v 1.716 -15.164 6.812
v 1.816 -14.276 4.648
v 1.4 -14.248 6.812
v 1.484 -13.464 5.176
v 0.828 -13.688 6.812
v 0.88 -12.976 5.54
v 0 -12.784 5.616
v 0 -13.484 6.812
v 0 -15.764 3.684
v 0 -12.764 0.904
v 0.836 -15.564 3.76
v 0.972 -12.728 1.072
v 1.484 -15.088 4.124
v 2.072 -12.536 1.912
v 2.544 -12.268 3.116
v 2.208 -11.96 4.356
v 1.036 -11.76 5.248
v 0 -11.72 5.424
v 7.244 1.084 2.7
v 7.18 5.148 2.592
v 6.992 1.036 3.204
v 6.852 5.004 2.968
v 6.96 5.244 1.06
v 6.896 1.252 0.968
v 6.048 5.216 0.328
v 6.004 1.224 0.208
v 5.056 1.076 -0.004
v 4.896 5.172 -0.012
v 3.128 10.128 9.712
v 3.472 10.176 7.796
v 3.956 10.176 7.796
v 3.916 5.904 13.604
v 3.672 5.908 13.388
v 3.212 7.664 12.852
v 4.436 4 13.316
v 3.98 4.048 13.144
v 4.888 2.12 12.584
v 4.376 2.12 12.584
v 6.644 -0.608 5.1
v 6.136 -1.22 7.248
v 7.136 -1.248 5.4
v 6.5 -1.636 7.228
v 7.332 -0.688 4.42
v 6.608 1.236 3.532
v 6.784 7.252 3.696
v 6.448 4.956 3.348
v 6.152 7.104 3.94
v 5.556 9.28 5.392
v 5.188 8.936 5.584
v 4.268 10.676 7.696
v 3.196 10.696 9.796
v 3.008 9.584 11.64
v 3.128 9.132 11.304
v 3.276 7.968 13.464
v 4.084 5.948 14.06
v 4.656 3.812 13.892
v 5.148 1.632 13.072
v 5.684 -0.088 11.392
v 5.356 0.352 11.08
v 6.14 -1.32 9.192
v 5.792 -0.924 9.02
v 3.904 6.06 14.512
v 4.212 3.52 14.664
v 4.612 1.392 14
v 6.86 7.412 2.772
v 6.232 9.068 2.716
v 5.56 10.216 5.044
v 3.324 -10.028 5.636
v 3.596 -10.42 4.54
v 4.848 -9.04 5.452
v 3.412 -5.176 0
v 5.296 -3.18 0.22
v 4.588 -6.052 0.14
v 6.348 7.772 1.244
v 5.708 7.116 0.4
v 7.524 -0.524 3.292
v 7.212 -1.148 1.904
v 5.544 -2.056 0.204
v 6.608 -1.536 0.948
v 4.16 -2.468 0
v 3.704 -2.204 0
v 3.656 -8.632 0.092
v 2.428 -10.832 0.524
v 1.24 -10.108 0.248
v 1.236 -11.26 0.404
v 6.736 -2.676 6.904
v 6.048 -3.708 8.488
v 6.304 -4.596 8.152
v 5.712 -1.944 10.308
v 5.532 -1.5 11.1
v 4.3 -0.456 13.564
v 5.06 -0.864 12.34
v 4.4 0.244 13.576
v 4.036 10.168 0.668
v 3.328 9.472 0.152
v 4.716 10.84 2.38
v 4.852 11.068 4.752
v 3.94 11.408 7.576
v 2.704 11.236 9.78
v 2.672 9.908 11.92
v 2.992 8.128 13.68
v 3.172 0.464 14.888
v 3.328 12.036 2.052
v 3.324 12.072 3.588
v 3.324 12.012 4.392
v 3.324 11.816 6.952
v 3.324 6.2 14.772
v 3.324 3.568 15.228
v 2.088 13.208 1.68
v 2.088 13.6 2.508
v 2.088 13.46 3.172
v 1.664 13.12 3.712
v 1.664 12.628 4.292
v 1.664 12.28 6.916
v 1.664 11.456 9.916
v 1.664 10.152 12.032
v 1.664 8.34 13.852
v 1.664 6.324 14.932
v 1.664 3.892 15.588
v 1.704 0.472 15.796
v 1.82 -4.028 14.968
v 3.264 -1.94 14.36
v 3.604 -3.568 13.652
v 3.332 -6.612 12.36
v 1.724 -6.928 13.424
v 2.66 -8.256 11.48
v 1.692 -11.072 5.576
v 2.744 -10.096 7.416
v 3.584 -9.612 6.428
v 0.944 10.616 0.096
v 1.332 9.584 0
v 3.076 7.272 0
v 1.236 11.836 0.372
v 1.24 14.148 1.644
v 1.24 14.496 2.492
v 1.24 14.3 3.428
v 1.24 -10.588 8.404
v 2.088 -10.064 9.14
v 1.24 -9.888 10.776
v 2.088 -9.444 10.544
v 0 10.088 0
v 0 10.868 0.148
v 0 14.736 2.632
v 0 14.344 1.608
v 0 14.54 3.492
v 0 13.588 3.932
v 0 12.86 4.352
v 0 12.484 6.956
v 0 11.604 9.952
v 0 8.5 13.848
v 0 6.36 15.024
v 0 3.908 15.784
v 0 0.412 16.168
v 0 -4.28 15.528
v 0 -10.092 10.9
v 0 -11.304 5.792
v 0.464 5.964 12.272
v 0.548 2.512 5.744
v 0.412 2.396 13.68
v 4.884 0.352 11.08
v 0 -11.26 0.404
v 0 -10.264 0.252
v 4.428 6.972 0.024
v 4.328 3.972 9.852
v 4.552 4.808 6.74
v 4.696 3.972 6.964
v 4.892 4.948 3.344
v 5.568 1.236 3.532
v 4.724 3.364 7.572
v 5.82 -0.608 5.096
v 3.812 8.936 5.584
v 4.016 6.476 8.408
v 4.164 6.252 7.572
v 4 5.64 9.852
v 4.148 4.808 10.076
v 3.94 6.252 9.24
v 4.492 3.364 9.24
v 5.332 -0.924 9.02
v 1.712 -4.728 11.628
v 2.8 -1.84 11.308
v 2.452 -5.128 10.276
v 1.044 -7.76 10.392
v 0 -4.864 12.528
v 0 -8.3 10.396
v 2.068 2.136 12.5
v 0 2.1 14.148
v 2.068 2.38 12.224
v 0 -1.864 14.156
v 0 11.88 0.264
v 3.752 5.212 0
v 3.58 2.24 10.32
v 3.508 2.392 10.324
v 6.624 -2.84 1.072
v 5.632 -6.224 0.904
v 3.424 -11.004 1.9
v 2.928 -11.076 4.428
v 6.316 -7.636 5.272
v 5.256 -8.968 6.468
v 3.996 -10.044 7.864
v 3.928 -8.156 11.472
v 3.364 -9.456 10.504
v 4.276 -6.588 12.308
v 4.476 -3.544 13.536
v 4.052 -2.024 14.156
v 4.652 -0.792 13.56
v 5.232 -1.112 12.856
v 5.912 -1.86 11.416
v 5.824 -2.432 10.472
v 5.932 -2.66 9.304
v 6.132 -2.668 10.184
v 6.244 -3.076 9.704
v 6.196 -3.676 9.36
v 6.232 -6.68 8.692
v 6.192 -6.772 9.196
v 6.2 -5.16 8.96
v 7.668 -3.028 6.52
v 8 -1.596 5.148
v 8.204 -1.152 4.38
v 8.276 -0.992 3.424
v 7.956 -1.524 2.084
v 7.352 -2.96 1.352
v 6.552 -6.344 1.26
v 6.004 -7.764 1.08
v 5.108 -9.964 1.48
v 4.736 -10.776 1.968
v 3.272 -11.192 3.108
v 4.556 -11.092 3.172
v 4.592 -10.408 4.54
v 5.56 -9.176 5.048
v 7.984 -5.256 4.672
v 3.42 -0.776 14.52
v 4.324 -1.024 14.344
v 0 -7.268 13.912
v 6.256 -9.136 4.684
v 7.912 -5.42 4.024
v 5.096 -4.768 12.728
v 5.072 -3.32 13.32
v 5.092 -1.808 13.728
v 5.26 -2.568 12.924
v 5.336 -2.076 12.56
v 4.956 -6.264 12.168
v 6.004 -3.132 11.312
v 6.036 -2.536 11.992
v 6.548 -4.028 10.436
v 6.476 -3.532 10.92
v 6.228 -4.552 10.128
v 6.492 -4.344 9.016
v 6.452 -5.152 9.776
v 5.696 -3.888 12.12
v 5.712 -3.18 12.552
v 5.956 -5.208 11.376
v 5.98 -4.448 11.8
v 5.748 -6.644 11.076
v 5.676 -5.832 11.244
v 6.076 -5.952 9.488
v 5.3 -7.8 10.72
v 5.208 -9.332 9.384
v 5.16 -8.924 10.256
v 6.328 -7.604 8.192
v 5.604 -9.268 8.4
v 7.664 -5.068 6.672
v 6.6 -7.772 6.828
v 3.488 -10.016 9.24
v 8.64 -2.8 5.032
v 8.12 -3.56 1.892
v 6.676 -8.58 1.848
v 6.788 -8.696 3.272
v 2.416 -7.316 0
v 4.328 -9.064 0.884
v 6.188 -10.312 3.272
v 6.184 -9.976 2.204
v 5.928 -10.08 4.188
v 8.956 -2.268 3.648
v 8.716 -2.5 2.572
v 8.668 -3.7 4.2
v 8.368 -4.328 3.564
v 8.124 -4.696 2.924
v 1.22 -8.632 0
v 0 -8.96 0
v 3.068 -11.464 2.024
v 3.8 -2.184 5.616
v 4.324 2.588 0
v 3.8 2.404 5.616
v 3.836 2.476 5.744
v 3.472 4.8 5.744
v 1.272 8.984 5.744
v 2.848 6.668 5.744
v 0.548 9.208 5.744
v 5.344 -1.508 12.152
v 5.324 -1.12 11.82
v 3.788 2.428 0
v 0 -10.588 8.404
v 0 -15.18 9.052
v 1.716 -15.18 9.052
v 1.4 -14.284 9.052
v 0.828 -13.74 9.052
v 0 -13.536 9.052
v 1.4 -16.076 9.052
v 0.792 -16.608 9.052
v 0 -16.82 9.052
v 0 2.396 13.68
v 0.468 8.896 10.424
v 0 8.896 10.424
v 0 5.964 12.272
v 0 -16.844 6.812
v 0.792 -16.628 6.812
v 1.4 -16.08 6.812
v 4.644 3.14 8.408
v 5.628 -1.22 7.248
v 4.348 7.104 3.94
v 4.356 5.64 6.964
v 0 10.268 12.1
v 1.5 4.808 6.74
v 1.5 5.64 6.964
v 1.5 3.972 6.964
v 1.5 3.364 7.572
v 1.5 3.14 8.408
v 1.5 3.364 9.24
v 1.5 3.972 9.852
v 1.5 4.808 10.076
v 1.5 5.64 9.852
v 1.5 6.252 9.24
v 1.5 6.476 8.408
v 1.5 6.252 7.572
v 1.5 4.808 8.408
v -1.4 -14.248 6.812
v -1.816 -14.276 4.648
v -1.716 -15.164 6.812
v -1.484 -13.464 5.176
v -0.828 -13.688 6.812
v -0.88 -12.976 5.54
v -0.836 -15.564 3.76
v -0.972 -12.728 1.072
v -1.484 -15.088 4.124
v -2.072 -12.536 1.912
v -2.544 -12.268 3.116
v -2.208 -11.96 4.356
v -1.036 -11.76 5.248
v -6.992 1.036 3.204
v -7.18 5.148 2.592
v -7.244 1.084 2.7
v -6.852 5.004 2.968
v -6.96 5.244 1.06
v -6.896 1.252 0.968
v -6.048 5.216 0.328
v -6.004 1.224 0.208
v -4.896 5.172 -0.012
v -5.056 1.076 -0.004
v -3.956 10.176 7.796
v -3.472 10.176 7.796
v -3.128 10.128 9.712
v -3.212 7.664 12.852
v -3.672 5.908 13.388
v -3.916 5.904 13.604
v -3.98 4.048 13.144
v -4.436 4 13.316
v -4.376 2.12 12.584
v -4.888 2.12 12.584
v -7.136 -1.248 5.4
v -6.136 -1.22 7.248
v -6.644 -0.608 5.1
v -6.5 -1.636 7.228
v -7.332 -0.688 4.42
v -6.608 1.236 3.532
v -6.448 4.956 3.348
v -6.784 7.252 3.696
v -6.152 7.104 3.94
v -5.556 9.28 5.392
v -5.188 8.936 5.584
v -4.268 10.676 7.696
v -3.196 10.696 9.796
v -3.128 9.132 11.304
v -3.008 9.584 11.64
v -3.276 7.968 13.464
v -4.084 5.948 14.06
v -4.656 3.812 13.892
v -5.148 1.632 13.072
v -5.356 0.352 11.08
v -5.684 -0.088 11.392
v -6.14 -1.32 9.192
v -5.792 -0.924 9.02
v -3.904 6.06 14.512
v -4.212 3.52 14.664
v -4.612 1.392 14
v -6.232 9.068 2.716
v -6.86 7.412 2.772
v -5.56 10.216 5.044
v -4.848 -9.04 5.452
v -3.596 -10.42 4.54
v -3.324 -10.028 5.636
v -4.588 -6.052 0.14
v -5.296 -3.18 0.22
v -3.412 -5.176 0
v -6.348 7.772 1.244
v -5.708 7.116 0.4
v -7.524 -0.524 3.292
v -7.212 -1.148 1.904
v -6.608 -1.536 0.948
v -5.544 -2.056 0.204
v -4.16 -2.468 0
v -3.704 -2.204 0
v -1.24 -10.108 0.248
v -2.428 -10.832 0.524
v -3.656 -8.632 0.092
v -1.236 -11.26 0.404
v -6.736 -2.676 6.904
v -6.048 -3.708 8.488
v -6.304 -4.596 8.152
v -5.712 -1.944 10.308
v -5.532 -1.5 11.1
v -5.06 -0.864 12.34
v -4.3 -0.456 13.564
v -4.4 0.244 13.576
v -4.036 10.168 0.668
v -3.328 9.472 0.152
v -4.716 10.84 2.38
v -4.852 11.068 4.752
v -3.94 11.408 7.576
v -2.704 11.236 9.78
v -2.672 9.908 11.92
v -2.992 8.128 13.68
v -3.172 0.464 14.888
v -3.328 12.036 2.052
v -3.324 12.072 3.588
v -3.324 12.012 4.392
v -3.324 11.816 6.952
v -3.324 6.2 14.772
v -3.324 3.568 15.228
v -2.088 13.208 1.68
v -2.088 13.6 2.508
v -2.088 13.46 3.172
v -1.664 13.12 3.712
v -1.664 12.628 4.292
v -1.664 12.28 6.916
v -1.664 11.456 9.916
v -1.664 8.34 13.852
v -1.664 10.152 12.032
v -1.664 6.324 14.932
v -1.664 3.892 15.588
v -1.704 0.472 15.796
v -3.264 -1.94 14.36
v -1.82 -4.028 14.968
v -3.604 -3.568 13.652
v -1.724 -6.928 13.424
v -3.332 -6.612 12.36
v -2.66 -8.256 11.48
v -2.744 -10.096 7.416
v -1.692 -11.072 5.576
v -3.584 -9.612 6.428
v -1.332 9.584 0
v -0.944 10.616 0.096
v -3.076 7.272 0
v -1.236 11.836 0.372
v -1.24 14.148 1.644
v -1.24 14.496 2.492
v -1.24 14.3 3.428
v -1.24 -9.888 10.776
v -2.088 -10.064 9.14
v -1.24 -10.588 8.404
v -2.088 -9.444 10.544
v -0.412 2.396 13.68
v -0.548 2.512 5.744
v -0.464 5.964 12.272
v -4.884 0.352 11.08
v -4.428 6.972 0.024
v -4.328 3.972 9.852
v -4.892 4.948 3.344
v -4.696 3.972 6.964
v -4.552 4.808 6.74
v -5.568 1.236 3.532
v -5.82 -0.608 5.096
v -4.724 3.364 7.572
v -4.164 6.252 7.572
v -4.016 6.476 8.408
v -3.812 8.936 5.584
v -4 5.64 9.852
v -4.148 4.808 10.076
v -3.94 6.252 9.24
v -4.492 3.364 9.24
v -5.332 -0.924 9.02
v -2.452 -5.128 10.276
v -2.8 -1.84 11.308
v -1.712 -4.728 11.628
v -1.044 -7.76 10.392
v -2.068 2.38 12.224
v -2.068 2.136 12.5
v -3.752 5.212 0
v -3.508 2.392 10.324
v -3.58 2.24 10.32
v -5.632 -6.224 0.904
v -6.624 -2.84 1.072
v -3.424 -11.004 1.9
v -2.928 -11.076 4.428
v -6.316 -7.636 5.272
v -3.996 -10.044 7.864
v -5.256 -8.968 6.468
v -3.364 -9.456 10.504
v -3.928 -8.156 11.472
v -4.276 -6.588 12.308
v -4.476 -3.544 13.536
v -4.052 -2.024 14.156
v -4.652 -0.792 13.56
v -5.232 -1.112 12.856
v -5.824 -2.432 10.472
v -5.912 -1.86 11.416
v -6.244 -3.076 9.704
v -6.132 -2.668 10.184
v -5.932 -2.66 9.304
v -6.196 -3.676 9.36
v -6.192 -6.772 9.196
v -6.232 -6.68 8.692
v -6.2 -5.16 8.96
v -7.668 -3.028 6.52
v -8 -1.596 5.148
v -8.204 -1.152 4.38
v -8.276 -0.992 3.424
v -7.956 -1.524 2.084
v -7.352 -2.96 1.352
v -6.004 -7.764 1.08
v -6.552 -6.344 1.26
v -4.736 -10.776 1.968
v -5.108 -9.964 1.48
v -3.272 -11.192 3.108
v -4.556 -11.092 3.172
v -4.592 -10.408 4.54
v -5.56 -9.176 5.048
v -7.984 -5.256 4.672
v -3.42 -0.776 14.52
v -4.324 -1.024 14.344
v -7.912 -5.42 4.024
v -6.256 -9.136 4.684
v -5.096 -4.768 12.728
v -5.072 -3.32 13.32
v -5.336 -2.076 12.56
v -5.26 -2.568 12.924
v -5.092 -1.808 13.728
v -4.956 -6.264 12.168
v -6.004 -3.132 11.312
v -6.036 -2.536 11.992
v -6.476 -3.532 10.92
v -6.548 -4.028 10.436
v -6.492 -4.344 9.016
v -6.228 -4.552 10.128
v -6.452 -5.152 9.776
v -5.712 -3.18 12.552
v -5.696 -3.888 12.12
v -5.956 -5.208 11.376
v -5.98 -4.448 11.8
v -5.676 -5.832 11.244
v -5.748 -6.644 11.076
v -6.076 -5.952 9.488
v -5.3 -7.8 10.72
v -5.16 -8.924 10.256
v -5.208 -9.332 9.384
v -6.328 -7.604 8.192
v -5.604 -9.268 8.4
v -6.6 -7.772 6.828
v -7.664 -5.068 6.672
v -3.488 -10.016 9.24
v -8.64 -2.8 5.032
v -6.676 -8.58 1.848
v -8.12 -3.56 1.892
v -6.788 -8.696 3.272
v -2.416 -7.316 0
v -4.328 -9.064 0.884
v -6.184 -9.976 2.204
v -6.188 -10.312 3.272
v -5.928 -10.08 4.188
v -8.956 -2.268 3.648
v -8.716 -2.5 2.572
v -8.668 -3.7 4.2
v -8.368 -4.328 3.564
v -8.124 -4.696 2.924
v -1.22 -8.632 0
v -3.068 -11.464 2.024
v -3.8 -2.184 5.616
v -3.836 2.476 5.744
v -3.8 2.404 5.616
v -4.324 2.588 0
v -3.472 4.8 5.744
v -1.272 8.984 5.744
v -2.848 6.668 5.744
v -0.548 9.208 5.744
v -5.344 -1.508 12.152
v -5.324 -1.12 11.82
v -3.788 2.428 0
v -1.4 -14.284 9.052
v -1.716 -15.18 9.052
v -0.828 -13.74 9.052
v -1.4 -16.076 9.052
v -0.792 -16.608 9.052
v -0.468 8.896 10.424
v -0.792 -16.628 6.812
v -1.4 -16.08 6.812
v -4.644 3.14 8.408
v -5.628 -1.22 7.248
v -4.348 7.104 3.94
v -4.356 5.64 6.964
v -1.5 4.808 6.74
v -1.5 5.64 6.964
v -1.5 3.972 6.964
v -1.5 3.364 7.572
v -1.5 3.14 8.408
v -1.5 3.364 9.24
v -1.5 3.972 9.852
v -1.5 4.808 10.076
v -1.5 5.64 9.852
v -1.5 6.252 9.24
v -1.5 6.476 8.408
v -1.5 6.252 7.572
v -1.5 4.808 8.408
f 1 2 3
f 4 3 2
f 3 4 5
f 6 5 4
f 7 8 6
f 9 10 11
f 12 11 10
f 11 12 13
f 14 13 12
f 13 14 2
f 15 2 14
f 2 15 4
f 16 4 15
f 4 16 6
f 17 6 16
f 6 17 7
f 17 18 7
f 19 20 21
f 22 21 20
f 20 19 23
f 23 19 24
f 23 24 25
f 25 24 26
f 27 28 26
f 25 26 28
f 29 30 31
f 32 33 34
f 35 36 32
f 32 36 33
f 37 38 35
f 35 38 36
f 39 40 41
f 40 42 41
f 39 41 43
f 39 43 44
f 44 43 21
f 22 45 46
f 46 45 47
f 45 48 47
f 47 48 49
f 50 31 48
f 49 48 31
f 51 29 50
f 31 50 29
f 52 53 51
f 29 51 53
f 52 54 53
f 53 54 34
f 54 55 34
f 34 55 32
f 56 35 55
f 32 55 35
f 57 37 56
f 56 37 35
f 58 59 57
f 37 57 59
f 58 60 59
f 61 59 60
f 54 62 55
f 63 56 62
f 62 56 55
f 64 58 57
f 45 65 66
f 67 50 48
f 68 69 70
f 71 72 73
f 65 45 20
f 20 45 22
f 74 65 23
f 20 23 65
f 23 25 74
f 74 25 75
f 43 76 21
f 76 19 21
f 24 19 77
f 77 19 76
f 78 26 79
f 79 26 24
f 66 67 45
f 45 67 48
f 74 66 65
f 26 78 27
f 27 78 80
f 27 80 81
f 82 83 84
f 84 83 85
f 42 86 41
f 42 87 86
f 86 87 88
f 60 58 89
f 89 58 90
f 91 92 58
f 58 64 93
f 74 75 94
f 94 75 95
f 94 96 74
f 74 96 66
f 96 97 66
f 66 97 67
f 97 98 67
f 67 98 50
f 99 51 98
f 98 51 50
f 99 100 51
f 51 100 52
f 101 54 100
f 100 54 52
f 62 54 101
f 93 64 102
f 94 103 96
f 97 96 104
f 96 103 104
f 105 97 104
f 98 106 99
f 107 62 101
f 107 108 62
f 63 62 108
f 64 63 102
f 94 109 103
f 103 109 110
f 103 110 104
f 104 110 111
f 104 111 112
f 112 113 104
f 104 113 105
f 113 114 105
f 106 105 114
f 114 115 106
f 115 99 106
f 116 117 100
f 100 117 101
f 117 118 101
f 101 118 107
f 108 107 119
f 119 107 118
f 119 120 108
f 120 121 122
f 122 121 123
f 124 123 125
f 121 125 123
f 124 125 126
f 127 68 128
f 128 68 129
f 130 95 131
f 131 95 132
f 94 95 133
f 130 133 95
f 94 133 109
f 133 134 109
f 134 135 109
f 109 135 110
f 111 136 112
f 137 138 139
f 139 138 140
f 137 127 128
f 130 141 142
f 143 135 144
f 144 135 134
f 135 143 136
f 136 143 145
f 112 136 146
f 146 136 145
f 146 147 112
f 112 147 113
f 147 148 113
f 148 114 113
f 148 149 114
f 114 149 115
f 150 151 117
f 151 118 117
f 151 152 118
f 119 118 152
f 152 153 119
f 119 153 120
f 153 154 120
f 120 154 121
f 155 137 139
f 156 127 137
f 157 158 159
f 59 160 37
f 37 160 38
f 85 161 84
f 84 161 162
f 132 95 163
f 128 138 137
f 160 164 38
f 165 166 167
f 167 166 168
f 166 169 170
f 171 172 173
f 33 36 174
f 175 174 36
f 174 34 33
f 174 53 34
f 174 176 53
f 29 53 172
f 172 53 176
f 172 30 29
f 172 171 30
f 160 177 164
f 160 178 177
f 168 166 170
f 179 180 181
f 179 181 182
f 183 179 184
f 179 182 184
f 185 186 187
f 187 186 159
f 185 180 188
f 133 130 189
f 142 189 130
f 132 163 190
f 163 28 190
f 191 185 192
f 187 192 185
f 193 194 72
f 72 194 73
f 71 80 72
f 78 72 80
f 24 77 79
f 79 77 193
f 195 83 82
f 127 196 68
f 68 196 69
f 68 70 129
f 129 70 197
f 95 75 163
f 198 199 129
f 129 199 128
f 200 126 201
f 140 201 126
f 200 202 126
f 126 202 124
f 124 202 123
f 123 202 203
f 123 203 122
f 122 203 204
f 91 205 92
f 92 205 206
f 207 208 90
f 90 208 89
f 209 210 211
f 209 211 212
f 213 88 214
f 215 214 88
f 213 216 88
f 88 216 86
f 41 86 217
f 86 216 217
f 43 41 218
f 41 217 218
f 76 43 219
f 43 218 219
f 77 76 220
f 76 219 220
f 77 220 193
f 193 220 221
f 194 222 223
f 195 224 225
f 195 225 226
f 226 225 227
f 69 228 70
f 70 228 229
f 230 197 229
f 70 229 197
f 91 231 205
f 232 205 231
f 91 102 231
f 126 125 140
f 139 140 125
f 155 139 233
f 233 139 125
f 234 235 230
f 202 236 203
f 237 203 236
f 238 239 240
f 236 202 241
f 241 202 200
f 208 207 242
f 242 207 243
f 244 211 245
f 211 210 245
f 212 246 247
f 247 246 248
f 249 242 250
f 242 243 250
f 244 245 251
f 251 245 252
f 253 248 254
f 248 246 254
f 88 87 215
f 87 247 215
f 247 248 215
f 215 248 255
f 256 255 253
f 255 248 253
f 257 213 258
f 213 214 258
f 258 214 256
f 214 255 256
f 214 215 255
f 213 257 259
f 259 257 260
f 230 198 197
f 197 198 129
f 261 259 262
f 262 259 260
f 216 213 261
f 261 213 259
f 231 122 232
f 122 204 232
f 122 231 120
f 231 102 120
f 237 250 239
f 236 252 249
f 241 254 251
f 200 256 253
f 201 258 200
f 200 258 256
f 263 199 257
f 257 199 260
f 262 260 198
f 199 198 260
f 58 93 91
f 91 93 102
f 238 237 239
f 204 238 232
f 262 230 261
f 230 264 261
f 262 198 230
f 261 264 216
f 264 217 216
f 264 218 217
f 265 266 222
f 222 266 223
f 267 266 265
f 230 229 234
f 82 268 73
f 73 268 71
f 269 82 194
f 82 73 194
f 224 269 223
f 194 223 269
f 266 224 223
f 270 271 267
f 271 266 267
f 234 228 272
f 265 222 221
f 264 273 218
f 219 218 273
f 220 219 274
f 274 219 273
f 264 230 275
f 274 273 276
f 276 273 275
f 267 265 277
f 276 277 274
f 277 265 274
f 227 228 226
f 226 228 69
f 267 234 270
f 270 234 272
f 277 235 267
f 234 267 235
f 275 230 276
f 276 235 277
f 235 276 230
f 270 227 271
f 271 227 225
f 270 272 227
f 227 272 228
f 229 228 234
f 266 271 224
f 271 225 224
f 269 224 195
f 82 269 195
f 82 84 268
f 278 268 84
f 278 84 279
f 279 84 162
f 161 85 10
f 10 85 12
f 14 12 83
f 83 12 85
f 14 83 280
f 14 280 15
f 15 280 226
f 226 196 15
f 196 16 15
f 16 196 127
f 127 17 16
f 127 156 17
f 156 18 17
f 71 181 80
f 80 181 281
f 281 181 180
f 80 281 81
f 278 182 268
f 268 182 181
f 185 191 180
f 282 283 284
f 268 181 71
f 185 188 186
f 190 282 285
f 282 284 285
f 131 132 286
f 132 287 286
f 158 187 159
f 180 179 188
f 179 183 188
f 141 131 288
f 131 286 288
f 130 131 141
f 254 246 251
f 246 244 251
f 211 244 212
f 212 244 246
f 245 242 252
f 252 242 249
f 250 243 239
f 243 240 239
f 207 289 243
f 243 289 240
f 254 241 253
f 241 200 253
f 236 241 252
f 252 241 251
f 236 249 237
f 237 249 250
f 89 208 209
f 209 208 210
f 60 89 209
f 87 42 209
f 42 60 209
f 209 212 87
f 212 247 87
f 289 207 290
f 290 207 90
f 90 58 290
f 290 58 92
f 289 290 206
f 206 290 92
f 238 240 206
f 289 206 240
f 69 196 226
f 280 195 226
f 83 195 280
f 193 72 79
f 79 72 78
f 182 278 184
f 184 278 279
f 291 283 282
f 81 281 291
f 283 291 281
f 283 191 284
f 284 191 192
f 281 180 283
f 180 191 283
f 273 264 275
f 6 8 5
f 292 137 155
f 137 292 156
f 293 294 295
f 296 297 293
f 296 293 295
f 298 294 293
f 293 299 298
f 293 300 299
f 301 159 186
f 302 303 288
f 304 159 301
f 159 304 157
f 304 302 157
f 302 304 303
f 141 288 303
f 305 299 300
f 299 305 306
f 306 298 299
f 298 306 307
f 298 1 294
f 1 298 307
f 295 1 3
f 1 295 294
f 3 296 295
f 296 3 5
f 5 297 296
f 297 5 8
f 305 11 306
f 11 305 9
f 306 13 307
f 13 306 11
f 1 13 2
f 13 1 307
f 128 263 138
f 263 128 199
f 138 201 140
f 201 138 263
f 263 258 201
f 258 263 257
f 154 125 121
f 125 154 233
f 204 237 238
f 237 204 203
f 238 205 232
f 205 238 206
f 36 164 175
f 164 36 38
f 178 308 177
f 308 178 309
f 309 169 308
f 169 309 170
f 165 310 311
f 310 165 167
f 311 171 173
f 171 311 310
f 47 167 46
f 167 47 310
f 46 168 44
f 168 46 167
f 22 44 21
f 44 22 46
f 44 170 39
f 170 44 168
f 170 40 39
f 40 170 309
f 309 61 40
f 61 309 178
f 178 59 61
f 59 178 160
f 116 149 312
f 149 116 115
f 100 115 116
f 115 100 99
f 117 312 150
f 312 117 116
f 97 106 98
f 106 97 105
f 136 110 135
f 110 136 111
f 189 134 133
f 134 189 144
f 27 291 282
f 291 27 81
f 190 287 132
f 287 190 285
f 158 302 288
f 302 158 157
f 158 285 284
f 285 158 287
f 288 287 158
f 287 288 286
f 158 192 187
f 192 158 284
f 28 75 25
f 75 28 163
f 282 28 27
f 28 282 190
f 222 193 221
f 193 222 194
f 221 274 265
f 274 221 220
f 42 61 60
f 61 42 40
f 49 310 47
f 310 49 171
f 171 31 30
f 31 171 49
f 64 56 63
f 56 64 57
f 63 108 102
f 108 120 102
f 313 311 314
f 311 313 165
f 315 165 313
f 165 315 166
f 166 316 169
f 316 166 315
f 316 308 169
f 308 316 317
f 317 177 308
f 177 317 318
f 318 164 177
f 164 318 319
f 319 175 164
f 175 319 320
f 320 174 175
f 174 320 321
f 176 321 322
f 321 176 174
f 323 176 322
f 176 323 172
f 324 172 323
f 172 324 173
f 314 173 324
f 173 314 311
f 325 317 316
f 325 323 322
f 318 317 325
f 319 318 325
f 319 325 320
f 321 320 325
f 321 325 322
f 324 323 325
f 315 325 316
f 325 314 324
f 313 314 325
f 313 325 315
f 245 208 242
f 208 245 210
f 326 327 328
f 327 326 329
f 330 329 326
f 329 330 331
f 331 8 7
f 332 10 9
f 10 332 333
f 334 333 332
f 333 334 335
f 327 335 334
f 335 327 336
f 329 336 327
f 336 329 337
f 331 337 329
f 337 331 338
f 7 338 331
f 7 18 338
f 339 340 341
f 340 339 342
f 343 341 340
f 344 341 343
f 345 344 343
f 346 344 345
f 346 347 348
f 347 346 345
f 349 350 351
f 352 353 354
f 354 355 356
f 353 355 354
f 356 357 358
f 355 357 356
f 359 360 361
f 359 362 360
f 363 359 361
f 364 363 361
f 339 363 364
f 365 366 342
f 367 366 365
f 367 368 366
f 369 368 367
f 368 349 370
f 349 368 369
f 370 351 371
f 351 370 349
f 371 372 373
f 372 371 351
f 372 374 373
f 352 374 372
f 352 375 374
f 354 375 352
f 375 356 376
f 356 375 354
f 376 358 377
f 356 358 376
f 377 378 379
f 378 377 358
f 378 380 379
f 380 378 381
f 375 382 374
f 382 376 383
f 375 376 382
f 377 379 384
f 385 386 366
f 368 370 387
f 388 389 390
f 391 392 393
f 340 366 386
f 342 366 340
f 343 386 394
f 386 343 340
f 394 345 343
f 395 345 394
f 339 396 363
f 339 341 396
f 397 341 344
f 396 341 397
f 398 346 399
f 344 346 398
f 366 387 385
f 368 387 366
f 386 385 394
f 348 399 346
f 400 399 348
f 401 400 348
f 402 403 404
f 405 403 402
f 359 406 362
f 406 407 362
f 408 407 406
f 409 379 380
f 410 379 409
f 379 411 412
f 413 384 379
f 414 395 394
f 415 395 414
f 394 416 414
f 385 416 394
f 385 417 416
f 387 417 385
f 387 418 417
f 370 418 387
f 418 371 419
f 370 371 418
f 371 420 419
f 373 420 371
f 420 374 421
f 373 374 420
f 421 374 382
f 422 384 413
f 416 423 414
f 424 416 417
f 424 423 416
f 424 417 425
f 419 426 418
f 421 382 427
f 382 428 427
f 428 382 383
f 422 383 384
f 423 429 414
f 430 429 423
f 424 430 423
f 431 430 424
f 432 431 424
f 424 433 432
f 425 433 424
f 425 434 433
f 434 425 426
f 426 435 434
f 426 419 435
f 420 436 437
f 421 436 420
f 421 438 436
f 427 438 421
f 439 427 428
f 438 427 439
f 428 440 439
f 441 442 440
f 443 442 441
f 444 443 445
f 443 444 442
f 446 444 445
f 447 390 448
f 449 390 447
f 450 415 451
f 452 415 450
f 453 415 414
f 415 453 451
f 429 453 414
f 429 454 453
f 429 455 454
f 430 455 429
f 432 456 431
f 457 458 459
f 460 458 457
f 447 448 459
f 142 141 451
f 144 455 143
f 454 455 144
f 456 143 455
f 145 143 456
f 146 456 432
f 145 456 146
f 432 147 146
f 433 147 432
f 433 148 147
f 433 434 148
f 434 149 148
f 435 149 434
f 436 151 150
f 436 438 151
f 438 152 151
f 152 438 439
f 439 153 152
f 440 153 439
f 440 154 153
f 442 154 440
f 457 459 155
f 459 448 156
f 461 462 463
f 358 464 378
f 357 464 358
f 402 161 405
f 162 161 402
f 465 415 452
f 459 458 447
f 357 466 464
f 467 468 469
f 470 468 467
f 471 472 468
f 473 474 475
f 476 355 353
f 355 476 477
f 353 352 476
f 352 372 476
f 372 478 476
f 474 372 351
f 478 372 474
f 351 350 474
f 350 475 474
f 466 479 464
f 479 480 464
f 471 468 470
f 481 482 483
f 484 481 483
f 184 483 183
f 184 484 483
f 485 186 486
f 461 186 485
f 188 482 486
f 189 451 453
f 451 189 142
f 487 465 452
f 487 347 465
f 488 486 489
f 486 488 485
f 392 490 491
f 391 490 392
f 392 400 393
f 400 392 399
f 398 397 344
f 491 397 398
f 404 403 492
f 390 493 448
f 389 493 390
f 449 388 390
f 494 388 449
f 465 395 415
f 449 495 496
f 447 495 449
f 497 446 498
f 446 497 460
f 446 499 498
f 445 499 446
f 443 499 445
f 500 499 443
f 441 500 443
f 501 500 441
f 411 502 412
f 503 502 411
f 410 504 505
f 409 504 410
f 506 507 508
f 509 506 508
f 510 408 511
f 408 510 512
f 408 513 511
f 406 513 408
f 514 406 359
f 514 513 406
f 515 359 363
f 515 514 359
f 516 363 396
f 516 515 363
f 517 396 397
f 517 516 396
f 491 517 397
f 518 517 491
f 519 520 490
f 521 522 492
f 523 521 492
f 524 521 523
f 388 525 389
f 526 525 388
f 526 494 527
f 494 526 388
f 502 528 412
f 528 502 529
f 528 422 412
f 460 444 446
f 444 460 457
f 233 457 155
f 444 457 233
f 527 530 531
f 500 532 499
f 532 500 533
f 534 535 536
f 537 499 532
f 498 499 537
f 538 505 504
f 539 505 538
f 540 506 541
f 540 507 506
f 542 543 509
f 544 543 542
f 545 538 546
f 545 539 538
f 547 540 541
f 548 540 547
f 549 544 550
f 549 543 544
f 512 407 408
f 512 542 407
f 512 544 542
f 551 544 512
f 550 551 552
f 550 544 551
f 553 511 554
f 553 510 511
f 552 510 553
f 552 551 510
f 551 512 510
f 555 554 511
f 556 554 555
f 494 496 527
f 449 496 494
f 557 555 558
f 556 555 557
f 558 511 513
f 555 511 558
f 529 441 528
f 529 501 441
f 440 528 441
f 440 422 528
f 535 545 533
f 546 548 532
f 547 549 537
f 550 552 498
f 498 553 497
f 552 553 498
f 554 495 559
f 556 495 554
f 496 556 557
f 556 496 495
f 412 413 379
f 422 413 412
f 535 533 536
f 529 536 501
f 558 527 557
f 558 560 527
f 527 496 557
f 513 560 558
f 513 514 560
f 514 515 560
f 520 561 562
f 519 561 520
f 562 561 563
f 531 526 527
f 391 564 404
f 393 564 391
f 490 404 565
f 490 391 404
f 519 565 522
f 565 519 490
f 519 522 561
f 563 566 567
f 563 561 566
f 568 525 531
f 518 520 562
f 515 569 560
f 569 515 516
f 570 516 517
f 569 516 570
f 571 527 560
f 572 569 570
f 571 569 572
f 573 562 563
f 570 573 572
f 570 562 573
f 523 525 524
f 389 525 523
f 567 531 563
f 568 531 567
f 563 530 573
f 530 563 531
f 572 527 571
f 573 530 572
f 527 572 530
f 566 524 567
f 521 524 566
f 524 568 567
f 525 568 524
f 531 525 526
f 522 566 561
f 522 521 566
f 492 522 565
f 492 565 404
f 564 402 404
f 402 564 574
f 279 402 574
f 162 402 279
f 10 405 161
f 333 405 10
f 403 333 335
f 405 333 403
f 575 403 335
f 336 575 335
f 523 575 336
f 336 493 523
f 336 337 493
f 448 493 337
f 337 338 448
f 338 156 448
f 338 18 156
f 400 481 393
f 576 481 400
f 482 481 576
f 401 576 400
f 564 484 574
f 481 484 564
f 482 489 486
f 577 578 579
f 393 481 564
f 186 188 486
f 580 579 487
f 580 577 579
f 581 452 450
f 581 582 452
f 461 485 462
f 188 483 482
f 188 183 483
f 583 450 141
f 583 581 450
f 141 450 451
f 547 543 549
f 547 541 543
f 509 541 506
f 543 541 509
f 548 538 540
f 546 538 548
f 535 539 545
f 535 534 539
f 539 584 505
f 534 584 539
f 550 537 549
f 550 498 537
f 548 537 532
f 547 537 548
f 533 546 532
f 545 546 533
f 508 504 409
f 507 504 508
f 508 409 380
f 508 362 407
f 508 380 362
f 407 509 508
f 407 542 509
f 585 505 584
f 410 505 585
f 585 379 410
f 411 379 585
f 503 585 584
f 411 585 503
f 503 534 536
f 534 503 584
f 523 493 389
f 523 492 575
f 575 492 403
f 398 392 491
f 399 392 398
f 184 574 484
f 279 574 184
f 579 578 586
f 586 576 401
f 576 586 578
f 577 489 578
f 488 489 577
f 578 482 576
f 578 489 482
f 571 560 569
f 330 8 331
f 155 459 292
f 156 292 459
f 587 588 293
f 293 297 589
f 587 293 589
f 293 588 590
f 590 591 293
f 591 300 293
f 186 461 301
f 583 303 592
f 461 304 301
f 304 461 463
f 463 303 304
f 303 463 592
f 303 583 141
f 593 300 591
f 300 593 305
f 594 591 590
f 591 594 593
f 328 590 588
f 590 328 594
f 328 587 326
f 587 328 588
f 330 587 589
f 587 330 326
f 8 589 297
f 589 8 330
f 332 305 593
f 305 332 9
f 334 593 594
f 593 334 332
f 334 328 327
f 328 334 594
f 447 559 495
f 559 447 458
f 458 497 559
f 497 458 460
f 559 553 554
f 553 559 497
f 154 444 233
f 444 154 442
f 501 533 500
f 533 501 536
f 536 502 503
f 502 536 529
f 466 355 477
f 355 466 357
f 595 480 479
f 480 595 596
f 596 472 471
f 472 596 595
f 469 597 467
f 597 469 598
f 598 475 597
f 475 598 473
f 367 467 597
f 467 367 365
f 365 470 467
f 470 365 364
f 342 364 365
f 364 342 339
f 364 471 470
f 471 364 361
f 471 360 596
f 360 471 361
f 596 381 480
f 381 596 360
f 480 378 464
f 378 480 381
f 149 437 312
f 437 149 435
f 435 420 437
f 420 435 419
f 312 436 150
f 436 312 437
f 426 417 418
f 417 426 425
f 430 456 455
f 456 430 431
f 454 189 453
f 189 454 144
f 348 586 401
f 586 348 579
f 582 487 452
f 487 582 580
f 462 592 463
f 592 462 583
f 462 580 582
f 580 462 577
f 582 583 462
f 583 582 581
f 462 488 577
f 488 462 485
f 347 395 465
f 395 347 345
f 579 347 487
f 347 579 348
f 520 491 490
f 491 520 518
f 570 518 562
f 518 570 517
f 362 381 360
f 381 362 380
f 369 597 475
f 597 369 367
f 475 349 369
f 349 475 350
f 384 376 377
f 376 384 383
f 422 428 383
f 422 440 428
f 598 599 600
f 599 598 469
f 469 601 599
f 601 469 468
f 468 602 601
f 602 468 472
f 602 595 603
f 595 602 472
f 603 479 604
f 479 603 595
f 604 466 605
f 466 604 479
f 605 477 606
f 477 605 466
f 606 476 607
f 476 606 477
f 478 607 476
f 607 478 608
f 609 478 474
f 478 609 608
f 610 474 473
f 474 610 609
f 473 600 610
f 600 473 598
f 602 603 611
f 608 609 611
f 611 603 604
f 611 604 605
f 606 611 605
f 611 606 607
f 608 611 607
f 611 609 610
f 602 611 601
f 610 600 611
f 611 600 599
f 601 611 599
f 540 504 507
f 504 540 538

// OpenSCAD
use <../lib.scad>
use <s/33048s01.scad>
function ldraw_lib__33048() = [
// 0 Minifig Food Turkey Body
// 0 Name: 33048.dat
// 0 Author: Andy Westrate [westrate]
// 0 !LDRAW_ORG Part UPDATE 2010-03
// 0 !LICENSE Licensed under CC BY 4.0 : see CAreadme.txt
// 
// 0 BFC CERTIFY CCW
  [0,"BFC","CERTIFY"],
  [0,"BFC","CCW"],
// 
// 0 !CATEGORY Minifig Accessory
// 
// 0 !HISTORY 2010-09-10 {LEGO Universe Team} Original part shape
// 0 !HISTORY 2010-10-02 [westrate] File preparation for LDraw Parts Tracker
// 0 !HISTORY 2010-12-31 [PTadmin] Official Update 2010-03
// 
// 
// 1 16 0 0 0 1 0 0 0 1 0 0 0 1 s\33048s01.dat
  [1,16,0,0,0,1,0,0,0,1,0,0,0,1, ldraw_lib__s__33048s01()],
// 1 16 0 0 0 -1 0 0 0 1 0 0 0 1 s\33048s01.dat
  [1,16,0,0,0,-1,0,0,0,1,0,0,0,1, ldraw_lib__s__33048s01()],
// 0
];
module ldraw_lib__33048(step=0, col=false, unit=2/5, alt=false, line=0.2, solid=!$preview)
    makepoly(ldraw_lib__33048(), step=step, col=col, unit=unit, alt=alt, line=line, solid=solid);
ldraw_lib__33048(line=0.2);
